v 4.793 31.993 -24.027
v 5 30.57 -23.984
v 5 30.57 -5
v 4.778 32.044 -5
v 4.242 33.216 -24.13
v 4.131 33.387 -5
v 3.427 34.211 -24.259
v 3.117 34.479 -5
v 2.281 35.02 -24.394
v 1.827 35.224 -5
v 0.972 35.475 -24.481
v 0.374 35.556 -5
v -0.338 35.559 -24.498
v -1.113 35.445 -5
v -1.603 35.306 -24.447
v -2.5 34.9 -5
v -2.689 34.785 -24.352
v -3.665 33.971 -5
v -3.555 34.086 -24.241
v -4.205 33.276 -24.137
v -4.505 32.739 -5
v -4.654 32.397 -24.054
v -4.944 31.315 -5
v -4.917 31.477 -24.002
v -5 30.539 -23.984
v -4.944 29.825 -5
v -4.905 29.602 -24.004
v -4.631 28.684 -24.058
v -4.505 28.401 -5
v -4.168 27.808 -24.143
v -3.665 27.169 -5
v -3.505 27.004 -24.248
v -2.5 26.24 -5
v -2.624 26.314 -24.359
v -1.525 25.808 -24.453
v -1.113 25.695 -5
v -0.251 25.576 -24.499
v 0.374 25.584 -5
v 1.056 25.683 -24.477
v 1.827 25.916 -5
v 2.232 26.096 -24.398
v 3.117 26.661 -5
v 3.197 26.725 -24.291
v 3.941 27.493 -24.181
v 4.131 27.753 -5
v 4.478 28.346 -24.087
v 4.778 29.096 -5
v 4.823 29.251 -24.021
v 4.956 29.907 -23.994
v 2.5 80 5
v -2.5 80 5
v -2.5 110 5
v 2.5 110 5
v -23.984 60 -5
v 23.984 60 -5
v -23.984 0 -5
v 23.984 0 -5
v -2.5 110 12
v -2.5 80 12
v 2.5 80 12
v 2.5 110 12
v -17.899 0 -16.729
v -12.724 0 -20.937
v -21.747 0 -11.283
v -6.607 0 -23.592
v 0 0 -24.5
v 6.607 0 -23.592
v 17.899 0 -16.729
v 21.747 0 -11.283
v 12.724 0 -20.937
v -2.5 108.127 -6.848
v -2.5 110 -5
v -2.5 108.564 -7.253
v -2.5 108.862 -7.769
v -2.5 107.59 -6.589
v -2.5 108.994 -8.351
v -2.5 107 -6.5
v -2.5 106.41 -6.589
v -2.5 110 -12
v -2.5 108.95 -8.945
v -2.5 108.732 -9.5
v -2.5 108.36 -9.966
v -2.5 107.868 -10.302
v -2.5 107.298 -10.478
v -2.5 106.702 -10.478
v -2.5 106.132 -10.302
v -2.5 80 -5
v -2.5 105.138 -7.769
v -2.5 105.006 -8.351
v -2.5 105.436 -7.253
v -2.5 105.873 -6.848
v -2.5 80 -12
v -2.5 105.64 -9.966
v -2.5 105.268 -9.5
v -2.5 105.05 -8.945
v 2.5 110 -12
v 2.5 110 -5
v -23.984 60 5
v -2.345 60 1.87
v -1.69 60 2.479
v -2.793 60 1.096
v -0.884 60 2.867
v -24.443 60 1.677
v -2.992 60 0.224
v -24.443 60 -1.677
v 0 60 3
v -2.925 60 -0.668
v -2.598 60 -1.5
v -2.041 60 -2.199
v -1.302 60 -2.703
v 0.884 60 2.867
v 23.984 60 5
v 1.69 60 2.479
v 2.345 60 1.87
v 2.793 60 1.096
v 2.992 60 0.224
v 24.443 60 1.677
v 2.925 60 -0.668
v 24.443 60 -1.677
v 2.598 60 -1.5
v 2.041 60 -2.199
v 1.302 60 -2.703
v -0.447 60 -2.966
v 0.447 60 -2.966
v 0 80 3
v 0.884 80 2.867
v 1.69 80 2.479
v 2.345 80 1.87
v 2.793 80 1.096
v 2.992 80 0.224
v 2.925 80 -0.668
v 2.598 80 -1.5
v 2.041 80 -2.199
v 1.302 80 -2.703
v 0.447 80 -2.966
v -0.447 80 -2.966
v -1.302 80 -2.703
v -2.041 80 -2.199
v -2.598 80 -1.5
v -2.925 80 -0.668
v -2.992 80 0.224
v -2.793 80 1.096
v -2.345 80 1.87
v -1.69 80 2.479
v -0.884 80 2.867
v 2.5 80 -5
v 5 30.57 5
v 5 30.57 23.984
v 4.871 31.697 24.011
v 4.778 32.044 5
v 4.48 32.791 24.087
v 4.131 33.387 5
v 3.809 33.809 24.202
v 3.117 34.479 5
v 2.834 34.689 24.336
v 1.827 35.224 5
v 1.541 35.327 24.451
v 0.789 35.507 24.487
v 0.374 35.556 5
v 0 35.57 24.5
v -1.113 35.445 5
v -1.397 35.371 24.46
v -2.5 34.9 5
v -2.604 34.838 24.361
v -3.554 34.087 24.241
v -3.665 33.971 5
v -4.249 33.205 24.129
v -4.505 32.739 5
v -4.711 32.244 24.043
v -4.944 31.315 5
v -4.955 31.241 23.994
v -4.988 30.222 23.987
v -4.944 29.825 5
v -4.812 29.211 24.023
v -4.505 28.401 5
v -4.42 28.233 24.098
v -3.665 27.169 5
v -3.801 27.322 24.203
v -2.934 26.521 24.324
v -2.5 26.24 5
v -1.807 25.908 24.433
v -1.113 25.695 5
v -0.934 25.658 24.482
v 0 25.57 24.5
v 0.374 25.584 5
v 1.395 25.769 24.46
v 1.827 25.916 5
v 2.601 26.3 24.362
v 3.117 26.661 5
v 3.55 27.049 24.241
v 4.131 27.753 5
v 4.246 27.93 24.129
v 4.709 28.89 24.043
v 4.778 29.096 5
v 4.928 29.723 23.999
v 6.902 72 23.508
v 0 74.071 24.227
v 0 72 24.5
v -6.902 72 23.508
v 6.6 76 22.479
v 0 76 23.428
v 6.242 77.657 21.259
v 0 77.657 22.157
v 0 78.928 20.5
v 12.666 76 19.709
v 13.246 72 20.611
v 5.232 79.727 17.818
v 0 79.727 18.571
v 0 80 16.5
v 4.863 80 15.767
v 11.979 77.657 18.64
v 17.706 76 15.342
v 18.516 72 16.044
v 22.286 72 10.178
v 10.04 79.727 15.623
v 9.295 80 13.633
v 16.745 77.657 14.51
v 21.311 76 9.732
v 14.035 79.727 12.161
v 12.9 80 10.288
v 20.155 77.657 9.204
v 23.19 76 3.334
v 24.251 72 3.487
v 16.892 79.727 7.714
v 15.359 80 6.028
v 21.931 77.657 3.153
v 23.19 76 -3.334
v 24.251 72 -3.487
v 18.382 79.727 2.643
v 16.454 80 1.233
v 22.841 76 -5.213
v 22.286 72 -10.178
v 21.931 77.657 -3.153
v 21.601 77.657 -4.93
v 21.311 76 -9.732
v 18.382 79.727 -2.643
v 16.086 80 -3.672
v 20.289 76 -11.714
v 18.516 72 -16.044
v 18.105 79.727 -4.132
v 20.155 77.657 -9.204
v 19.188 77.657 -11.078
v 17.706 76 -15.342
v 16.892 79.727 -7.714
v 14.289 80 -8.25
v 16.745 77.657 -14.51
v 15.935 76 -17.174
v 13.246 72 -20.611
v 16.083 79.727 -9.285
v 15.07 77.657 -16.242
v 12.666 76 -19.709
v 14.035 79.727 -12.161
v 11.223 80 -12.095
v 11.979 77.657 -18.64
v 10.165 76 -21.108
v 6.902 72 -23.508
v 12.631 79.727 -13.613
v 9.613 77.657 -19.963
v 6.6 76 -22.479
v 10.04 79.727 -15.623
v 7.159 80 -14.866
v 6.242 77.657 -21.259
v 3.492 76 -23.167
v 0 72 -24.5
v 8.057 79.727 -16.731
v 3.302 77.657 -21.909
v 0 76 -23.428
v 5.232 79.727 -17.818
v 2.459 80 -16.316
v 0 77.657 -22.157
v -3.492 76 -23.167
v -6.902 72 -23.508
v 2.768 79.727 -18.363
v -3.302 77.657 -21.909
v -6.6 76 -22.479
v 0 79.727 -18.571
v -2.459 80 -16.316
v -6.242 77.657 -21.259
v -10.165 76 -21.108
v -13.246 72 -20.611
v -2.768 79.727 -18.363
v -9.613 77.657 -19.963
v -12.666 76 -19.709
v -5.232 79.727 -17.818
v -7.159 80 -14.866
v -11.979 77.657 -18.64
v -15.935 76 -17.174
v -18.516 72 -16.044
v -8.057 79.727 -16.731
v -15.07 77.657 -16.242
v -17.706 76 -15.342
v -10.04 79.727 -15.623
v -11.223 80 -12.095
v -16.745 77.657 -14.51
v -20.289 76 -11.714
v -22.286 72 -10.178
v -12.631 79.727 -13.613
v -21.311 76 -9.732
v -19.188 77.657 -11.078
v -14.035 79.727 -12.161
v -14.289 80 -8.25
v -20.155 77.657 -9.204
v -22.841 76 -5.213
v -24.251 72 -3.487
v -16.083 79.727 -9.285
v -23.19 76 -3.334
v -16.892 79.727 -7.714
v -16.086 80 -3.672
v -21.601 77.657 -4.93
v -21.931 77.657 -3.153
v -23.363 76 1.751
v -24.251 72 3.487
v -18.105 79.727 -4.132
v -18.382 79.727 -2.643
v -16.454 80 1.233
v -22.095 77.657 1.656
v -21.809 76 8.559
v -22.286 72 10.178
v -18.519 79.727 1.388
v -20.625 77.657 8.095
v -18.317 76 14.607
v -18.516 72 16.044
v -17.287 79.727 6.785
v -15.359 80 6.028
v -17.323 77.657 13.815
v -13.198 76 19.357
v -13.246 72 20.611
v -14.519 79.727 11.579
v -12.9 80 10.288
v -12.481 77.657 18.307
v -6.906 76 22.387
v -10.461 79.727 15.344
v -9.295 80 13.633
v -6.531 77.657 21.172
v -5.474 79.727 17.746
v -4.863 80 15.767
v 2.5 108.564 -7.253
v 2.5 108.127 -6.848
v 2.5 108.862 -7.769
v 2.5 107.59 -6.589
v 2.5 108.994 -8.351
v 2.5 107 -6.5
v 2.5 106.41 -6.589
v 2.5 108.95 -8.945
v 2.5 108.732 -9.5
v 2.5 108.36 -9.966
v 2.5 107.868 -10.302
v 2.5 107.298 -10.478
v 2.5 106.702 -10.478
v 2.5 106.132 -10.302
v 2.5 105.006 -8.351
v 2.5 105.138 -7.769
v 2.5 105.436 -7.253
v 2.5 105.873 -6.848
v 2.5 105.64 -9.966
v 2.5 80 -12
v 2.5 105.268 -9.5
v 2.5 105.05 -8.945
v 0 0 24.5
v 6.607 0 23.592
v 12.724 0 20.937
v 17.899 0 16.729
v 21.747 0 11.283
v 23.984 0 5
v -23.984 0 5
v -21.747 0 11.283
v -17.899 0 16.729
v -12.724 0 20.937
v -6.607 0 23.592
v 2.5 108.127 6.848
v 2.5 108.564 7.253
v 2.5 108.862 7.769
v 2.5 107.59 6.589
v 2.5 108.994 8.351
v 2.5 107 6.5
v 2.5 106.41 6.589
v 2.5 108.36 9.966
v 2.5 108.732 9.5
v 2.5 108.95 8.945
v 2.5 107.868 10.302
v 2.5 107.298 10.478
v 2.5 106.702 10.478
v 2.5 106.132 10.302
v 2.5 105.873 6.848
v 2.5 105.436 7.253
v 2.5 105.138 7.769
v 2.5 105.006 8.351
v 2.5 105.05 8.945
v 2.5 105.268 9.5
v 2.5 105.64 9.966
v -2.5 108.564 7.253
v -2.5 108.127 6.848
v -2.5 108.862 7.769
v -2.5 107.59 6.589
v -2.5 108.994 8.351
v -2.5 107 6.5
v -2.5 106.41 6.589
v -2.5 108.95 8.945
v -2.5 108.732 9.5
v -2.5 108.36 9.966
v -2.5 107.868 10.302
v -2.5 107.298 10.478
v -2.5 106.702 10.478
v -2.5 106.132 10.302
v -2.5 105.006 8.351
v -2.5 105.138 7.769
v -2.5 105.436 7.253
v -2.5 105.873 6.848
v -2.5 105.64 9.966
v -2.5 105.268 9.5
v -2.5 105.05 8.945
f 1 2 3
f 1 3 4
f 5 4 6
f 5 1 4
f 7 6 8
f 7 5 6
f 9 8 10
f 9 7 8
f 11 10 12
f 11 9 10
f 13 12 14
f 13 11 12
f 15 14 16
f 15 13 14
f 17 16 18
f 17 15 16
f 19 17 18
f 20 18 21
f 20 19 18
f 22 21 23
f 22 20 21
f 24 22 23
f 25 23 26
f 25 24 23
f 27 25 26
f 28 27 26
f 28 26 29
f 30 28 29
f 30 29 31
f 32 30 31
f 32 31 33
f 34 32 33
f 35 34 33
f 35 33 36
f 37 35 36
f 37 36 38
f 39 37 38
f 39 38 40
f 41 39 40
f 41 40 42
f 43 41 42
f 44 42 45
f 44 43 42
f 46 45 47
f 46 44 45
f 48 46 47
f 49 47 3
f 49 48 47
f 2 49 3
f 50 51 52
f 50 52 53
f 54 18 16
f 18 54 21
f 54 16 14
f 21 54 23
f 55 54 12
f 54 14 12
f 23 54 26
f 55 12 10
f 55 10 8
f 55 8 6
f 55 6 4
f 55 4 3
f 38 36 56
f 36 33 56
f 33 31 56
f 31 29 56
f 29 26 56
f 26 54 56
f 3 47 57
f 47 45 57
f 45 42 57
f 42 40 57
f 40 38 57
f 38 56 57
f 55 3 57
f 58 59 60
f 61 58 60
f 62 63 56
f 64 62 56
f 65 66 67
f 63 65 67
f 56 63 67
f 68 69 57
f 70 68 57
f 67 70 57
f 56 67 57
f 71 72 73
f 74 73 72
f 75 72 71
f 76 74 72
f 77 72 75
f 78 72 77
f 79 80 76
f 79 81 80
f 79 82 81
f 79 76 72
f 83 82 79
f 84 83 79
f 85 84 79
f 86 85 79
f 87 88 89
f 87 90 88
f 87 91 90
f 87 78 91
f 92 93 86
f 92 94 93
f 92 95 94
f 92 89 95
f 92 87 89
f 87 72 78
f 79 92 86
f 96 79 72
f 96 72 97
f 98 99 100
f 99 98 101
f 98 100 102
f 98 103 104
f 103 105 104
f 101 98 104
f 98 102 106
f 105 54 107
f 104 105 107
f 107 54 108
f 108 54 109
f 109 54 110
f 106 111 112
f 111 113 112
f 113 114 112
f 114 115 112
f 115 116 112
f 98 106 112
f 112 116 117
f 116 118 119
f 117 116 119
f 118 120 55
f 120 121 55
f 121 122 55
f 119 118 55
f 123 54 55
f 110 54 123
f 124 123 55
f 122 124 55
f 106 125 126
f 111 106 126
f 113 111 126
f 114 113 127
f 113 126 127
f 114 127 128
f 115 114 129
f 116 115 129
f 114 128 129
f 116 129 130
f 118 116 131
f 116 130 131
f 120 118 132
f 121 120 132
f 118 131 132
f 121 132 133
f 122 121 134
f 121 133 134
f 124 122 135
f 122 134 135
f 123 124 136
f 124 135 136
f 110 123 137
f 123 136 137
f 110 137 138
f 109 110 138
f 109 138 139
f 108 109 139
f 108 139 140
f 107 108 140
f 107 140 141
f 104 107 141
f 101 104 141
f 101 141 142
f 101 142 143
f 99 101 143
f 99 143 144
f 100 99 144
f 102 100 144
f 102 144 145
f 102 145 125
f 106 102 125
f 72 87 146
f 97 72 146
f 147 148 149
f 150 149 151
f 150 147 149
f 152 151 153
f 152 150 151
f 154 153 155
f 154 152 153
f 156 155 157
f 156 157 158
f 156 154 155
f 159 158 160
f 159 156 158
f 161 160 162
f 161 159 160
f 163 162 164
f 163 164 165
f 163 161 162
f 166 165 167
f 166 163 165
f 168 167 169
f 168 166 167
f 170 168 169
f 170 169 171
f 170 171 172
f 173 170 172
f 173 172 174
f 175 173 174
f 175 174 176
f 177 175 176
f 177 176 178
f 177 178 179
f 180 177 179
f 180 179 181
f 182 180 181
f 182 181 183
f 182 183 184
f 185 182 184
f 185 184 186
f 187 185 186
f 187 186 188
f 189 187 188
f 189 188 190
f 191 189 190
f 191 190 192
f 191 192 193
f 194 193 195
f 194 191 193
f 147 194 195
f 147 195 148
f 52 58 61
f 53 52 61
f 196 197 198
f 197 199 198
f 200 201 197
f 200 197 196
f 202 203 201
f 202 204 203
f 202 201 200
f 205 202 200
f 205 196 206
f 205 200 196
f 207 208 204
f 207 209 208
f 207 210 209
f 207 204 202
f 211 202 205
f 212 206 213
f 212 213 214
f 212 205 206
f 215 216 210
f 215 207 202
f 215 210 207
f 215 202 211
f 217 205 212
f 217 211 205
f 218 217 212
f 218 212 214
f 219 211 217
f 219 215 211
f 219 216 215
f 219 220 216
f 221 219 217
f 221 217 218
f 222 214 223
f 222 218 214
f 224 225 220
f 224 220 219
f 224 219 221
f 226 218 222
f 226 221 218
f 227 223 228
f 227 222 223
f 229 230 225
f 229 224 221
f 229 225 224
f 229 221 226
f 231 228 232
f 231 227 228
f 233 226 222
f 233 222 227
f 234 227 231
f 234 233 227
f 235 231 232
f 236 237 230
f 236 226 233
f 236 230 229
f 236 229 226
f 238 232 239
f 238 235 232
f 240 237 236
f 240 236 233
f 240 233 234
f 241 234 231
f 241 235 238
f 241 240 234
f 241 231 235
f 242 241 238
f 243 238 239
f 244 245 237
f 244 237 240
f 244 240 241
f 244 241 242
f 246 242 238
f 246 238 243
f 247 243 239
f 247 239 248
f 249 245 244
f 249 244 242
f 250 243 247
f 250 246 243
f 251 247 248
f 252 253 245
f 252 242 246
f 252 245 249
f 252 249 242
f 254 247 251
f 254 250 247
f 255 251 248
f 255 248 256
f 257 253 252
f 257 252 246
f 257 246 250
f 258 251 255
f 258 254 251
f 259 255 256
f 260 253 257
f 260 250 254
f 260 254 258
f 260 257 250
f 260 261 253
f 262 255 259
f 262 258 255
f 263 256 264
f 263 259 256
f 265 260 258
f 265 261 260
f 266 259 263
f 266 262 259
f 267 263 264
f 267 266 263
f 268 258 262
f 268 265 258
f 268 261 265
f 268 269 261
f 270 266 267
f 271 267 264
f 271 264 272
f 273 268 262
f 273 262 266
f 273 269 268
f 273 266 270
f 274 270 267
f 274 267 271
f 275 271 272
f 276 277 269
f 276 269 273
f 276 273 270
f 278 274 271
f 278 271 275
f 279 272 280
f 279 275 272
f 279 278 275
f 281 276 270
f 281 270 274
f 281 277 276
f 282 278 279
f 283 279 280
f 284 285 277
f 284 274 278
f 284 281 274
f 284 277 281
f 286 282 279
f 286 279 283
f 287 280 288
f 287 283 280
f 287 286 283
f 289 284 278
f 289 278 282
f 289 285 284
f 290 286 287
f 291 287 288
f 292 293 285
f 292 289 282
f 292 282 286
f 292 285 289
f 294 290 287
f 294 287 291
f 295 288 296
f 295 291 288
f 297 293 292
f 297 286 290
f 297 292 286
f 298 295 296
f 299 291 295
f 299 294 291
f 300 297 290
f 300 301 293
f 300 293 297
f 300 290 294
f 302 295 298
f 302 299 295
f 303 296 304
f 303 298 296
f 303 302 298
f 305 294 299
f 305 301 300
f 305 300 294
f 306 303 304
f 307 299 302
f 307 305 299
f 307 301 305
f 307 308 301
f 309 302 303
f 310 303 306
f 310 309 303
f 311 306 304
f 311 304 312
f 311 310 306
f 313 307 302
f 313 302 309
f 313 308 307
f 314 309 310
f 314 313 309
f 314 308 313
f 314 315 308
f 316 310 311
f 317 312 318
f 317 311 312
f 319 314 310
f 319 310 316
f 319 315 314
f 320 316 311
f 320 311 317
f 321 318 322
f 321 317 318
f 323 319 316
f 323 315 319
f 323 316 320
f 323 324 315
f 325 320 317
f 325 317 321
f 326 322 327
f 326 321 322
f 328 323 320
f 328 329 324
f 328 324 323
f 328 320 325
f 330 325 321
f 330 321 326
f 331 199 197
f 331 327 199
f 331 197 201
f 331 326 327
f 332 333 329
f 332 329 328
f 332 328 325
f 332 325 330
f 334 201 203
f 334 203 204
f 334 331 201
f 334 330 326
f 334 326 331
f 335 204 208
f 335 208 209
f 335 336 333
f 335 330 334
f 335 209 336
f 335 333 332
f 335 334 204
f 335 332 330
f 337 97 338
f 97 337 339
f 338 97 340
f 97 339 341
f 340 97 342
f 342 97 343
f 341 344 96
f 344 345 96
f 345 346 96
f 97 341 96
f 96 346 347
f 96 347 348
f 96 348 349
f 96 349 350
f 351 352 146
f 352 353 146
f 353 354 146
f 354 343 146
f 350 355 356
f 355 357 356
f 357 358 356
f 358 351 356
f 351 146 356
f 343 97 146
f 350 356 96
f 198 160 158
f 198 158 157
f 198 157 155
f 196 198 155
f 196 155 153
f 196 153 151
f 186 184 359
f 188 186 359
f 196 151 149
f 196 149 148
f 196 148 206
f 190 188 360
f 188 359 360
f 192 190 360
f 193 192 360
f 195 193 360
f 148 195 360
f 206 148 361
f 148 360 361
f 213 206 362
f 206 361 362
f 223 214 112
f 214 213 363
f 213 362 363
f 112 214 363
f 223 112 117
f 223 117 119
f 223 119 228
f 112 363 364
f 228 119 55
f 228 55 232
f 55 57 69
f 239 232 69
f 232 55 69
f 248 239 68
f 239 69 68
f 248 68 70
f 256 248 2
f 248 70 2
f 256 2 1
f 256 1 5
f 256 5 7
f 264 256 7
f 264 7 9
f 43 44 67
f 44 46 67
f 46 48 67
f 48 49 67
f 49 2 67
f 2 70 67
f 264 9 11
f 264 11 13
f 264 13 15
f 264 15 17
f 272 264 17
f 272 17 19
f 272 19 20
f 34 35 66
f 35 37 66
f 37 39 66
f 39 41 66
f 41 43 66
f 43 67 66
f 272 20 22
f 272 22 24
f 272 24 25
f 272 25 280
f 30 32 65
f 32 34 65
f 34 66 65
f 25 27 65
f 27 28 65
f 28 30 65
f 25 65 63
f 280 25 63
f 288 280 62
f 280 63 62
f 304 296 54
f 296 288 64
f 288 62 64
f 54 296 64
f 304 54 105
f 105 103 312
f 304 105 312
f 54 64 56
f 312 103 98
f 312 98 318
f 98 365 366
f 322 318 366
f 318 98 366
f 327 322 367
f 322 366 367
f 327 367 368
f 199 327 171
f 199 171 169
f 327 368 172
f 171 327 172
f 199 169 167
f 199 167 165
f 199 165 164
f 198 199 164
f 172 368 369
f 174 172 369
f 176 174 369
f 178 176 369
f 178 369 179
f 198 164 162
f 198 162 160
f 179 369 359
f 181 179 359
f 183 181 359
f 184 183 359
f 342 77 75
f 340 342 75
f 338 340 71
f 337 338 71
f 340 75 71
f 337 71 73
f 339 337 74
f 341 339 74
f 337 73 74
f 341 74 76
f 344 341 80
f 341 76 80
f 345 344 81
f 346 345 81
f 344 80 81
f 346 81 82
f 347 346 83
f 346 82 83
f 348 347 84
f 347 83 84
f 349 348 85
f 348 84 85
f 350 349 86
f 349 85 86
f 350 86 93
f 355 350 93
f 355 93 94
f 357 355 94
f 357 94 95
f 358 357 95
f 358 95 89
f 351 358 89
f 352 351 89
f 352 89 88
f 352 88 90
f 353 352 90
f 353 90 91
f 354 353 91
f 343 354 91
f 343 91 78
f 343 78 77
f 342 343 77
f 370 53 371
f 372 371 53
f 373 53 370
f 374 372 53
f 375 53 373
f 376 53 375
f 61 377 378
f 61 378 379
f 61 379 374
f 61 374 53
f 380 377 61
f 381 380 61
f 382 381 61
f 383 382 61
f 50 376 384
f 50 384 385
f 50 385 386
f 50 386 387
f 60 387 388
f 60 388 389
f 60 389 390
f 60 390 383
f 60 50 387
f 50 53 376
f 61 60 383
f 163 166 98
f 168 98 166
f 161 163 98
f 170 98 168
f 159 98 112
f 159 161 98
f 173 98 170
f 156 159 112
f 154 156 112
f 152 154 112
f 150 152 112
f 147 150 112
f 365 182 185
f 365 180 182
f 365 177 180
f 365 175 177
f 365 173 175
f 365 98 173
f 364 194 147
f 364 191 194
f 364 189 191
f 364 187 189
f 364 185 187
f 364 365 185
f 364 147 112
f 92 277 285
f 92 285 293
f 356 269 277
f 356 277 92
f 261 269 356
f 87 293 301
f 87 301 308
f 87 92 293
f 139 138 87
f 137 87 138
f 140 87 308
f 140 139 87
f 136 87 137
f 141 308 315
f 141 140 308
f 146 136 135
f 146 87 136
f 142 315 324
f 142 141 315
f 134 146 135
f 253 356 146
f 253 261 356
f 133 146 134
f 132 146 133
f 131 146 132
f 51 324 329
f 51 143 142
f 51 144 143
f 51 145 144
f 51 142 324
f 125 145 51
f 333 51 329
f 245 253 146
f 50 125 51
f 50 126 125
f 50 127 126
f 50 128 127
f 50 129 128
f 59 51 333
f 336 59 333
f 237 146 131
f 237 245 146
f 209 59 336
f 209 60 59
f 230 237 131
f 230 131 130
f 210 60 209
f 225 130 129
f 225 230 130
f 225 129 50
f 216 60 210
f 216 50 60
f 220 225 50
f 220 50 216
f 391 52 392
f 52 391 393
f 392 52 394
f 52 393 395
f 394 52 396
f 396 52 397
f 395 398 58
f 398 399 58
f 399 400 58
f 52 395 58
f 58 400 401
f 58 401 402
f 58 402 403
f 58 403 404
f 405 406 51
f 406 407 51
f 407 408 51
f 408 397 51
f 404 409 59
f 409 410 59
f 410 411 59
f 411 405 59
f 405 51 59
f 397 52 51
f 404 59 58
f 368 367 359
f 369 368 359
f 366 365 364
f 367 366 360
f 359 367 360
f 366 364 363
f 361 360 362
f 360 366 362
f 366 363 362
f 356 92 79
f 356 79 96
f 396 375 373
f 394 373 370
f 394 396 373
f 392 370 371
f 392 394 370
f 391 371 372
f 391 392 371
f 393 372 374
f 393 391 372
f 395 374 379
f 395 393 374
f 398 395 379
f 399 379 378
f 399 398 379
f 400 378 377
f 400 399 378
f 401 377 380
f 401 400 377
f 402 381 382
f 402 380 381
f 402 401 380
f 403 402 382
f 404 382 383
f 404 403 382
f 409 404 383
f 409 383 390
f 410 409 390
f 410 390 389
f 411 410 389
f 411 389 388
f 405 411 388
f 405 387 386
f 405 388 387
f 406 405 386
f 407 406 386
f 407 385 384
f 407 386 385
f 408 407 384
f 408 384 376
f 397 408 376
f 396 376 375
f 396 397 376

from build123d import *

# Parameters (mm, degrees)
SKETCH1_R               = 24.5
BOSS_EXTRUDE1_DEPTH     = 80
FILLET1_R               = 8
CUT_EXTRUDE1_DEPTH      = 88.180846548
CUT_EXTRUDE1_DEPTH_BACK = 88.180846548
SKETCH2_R               = 5
SKETCH3_W               = 56.031714123
SKETCH3_H               = 10
CUT_EXTRUDE2_DEPTH      = 60
SKETCH4_R               = 3
CUT_EXTRUDE3_DEPTH      = 60
SKETCH5_W               = 5
SKETCH5_H               = 7
BOSS_EXTRUDE2_DEPTH     = 30
SKETCH6_R               = 2
CUT_EXTRUDE4_DEPTH      = 116.884640959


with BuildPart() as part:
    # Sketch1 → Boss-Extrude1 (new body)
    with BuildSketch(Plane(origin=(0, 0, 0), x_dir=(1, 0, 0), z_dir=(0, 1, 0))):
        with Locations(Location((0, 0, 0), (0, 0, 270))):
            Circle(SKETCH1_R)
    extrude(amount=BOSS_EXTRUDE1_DEPTH)

    # Fillet1
    fillet1_edges = [part.edges().sort_by_distance(p)[0] for p in [
        (0, 80, -24.5),
    ]]
    fillet(fillet1_edges, radius=FILLET1_R)

    # Sketch2 → Cut-Extrude1 (cut, two sides: drawn at the far end of the back side and taken through both)
    with BuildSketch(Plane.XY.offset(-CUT_EXTRUDE1_DEPTH_BACK)):
        with Locations((0, 30.57)):
            Circle(SKETCH2_R)
    extrude(amount=CUT_EXTRUDE1_DEPTH + CUT_EXTRUDE1_DEPTH_BACK, mode=Mode.SUBTRACT)

    # Sketch3 → Cut-Extrude2 (cut)
    with BuildSketch(Plane(origin=(0, 0, 0), x_dir=(1, 0, 0), z_dir=(0, 1, 0))):
        with Locations((-1.359495315, 0)):
            Rectangle(SKETCH3_W, SKETCH3_H)
    extrude(amount=CUT_EXTRUDE2_DEPTH, mode=Mode.SUBTRACT)

    # Sketch4 → Cut-Extrude3 (cut)
    with BuildSketch(Plane(origin=(0, 80, 0), x_dir=(1, 0, 0), z_dir=(0, 1, 0))):
        with Locations(Location((0, 0, 0), (0, 0, 270))):
            Circle(SKETCH4_R)
    extrude(amount=-CUT_EXTRUDE3_DEPTH, mode=Mode.SUBTRACT)

    # Sketch5 → Boss-Extrude2 (add)
    with BuildSketch(Plane(origin=(0, 80, 0), x_dir=(1, 0, 0), z_dir=(0, 1, 0))):
        with Locations((0, 8.5)):
            Rectangle(SKETCH5_W, SKETCH5_H)
    boss_extrude2 = extrude(amount=BOSS_EXTRUDE2_DEPTH)

    # Sketch6 → Cut-Extrude4 (cut, through all)
    with BuildSketch(Plane.ZY.offset(2.5)):
        with Locations((-8.5, 107)):
            Circle(SKETCH6_R)
    cut_extrude4 = extrude(amount=-CUT_EXTRUDE4_DEPTH, mode=Mode.SUBTRACT)

    # Mirror1: Boss-Extrude2, Cut-Extrude4 across plane
    add(boss_extrude2.mirror(Plane.XY))
    add(cut_extrude4.mirror(Plane.XY), mode=Mode.SUBTRACT)


solid = part.part
